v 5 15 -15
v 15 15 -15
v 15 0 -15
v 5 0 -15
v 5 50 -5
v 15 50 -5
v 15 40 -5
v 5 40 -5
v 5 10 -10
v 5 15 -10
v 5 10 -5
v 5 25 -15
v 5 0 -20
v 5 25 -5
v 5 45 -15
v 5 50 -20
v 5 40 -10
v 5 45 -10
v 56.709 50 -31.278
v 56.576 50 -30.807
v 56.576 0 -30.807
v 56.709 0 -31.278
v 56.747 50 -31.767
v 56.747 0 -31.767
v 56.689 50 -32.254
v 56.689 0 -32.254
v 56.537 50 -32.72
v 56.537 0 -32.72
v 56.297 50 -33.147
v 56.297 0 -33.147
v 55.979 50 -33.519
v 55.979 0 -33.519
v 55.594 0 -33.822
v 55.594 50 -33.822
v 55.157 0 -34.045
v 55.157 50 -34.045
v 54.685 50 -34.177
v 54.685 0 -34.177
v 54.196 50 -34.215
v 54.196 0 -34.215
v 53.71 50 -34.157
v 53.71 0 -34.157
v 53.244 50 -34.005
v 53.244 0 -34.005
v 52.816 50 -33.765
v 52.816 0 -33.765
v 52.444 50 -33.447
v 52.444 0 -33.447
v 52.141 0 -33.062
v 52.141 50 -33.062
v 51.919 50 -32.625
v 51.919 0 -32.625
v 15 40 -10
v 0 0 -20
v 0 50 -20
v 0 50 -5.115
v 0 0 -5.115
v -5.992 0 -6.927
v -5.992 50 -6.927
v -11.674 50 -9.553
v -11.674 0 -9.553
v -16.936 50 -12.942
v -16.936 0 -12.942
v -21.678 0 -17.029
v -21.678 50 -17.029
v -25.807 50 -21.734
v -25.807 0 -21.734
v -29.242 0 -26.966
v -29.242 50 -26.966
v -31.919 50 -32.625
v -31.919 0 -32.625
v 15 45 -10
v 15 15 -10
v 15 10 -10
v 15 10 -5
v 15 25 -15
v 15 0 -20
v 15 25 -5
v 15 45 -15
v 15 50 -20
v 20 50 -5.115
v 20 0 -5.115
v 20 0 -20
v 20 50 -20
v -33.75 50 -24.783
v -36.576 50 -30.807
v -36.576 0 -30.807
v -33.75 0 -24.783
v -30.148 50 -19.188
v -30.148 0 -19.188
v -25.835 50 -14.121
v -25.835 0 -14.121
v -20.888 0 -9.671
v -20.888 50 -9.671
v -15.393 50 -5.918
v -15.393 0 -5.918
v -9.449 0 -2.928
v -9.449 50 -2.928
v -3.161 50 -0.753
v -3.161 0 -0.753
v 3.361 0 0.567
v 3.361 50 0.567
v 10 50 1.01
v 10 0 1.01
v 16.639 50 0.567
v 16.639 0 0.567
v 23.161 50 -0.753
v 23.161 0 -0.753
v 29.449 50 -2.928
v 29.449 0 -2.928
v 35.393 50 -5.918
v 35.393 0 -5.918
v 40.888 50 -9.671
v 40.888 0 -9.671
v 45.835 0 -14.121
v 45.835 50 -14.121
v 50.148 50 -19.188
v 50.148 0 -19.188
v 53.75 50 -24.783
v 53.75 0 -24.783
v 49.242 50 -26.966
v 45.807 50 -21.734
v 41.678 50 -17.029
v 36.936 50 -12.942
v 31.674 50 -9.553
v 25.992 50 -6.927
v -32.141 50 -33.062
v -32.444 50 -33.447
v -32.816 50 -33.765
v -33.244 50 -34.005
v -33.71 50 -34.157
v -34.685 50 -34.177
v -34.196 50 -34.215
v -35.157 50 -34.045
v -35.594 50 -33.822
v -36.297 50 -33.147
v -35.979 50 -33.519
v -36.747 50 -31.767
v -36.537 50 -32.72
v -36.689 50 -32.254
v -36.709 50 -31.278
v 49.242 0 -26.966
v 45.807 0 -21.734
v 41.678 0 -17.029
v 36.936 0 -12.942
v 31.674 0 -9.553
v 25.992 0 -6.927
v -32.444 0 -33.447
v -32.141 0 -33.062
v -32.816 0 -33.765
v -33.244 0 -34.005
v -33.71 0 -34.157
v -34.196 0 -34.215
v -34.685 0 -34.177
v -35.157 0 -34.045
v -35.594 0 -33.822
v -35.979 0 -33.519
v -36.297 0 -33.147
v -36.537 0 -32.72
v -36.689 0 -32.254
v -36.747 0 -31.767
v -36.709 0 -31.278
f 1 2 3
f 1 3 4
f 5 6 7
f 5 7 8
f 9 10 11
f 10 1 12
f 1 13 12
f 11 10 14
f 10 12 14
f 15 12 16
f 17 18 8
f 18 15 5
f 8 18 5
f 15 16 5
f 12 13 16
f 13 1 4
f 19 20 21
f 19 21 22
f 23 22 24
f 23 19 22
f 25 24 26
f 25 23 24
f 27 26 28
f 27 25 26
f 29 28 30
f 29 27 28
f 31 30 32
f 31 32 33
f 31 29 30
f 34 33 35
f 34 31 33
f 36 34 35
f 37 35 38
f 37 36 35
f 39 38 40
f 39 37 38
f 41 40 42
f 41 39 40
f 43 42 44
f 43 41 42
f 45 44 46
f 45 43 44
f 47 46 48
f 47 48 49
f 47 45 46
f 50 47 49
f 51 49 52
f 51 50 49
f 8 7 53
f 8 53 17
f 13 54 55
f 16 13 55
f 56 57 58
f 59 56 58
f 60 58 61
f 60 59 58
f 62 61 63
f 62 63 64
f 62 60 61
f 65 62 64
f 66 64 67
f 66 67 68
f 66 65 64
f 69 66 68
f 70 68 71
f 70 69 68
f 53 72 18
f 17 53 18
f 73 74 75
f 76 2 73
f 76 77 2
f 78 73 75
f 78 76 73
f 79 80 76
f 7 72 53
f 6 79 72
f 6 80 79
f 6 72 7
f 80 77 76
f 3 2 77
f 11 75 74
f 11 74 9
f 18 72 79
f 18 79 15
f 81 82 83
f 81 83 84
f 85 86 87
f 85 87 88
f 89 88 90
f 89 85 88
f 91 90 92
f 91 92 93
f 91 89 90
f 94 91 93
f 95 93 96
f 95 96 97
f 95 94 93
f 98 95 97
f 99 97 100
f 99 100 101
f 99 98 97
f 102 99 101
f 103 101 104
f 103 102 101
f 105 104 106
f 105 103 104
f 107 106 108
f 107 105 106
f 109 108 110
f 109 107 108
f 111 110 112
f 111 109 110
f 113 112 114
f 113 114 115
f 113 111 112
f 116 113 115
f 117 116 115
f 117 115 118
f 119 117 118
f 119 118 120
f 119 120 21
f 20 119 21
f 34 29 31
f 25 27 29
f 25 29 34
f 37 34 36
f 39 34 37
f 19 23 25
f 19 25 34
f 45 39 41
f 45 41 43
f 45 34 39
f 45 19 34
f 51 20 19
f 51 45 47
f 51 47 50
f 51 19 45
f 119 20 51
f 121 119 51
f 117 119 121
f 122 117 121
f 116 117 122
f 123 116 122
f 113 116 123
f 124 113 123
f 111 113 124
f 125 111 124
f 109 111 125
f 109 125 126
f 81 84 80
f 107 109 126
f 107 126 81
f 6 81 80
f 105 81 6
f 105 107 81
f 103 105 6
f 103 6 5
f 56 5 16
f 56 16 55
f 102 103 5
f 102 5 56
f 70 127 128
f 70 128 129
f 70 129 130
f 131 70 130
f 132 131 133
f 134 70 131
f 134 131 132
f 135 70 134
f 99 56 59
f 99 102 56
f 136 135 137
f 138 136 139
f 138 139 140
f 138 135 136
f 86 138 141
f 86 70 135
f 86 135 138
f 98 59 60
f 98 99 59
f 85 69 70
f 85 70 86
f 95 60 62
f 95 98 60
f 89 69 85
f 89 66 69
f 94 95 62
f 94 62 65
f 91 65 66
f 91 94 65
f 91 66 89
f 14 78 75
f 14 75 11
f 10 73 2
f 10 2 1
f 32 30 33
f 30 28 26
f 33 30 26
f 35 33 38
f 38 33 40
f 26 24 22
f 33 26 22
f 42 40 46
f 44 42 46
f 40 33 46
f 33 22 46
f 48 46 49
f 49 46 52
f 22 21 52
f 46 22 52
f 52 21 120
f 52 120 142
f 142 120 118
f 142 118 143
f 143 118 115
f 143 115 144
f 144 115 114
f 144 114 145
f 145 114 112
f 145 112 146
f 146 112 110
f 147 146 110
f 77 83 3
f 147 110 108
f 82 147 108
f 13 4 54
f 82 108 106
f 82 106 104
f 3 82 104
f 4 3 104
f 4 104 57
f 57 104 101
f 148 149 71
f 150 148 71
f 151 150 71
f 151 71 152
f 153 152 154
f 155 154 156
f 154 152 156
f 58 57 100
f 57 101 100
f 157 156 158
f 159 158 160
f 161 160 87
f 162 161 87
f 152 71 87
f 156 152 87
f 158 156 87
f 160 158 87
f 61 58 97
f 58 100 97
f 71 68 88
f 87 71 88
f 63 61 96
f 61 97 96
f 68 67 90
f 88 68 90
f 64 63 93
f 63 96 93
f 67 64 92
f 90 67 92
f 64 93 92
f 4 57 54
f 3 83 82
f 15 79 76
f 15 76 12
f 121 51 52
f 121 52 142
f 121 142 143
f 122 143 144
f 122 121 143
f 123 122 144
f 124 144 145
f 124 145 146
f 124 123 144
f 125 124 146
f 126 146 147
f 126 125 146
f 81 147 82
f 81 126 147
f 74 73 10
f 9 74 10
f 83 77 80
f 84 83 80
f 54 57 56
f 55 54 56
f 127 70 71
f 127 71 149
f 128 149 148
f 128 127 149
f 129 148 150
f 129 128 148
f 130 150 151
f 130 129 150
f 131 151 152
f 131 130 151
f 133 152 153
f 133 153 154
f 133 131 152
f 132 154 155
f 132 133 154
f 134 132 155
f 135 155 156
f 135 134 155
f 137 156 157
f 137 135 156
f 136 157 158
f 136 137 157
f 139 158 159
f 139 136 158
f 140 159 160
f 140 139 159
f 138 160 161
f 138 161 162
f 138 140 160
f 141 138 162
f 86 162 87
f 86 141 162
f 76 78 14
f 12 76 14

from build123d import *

# Parameters (mm, degrees)
F0_W      = 50
F0_H      = 20
F1_DEPTH  = 20
F4_DEPTH  = 50
F5_W      = 10
F5_H      = 10
F6_DEPTH  = 5
F7_W      = 10
F7_H      = 5
F8_DEPTH  = 10
F9_W      = 10
F9_H      = 5
F10_DEPTH = 50
F12_W     = 10
F12_H     = 5
F13_DEPTH = 10
F14_W     = 10
F14_H     = 10
F15_DEPTH = 5
F16_W     = 10
F16_H     = 10
F17_DEPTH = 5


with BuildPart() as f1:
    # F0 (on Right) → F1 (new body)
    with BuildSketch(Plane.YZ):
        with Locations((25, -10)):
            Rectangle(F0_W, F0_H)
    extrude(amount=F1_DEPTH)

    # F3 (on offset) → F4 (join)
    with BuildSketch(Plane(origin=(0, 50, 0), x_dir=(-1, 0, 0), z_dir=(0, 1, 0))):
        with BuildLine():
            ThreePointArc((31.9188415439, -32.6248712805), (35.1568284949, -34.0445333899), (36.5764906043, -30.8065464388))
            ThreePointArc((36.5764906043, -30.8065464388), (-10, 1.0102051443), (-56.5764906043, -30.8065464388))
            ThreePointArc((-56.5764906043, -30.8065464388), (-55.1568284949, -34.0445333899), (-51.9188415439, -32.6248712805))
            ThreePointArc((-51.9188415439, -32.6248712805), (-10, -3.9897948557), (31.9188415439, -32.6248712805))
        make_face()
    extrude(amount=-F4_DEPTH)

    # F5 (on offset) → F6 (cut)
    with BuildSketch(Plane(origin=(0, 50, 0), x_dir=(-1, 0, 0), z_dir=(0, 1, 0))):
        with Locations((-10, -10)):
            Rectangle(F5_W, F5_H)
    extrude(amount=-F6_DEPTH, mode=Mode.SUBTRACT)

    # F7 (on offset) → F8 (cut)
    with BuildSketch(Plane(origin=(0, 50, 0), x_dir=(-1, 0, 0), z_dir=(0, 1, 0))):
        with Locations((-10, -7.5)):
            Rectangle(F7_W, F7_H)
    extrude(amount=-F8_DEPTH, mode=Mode.SUBTRACT)

    # F9 (on offset) → F10 (cut)
    with BuildSketch(Plane(origin=(0, 50, 0), x_dir=(-1, 0, 0), z_dir=(0, 1, 0))):
        with Locations((-10, -17.5)):
            Rectangle(F9_W, F9_H)
    extrude(amount=-F10_DEPTH, mode=Mode.SUBTRACT)

    # F12 (on offset) → F13 (cut)
    with BuildSketch(Plane(origin=(0, 20, 0), x_dir=(-1, 0, 0), z_dir=(0, 1, 0))):
        with Locations((-10, -7.5)):
            Rectangle(F12_W, F12_H)
    extrude(amount=-F13_DEPTH, mode=Mode.SUBTRACT)

    # F14 (on offset) → F15 (cut)
    with BuildSketch(Plane(origin=(0, 20, 0), x_dir=(-1, 0, 0), z_dir=(0, 1, 0))):
        with Locations((-10, -10)):
            Rectangle(F14_W, F14_H)
    extrude(amount=-F15_DEPTH, mode=Mode.SUBTRACT)

    # F16 (on offset) → F17 (cut)
    with BuildSketch(Plane(origin=(0, 20, 0), x_dir=(-1, 0, 0), z_dir=(0, 1, 0))):
        with Locations((-10, -10)):
            Rectangle(F16_W, F16_H)
    extrude(amount=F17_DEPTH, mode=Mode.SUBTRACT)


solid = f1.part
